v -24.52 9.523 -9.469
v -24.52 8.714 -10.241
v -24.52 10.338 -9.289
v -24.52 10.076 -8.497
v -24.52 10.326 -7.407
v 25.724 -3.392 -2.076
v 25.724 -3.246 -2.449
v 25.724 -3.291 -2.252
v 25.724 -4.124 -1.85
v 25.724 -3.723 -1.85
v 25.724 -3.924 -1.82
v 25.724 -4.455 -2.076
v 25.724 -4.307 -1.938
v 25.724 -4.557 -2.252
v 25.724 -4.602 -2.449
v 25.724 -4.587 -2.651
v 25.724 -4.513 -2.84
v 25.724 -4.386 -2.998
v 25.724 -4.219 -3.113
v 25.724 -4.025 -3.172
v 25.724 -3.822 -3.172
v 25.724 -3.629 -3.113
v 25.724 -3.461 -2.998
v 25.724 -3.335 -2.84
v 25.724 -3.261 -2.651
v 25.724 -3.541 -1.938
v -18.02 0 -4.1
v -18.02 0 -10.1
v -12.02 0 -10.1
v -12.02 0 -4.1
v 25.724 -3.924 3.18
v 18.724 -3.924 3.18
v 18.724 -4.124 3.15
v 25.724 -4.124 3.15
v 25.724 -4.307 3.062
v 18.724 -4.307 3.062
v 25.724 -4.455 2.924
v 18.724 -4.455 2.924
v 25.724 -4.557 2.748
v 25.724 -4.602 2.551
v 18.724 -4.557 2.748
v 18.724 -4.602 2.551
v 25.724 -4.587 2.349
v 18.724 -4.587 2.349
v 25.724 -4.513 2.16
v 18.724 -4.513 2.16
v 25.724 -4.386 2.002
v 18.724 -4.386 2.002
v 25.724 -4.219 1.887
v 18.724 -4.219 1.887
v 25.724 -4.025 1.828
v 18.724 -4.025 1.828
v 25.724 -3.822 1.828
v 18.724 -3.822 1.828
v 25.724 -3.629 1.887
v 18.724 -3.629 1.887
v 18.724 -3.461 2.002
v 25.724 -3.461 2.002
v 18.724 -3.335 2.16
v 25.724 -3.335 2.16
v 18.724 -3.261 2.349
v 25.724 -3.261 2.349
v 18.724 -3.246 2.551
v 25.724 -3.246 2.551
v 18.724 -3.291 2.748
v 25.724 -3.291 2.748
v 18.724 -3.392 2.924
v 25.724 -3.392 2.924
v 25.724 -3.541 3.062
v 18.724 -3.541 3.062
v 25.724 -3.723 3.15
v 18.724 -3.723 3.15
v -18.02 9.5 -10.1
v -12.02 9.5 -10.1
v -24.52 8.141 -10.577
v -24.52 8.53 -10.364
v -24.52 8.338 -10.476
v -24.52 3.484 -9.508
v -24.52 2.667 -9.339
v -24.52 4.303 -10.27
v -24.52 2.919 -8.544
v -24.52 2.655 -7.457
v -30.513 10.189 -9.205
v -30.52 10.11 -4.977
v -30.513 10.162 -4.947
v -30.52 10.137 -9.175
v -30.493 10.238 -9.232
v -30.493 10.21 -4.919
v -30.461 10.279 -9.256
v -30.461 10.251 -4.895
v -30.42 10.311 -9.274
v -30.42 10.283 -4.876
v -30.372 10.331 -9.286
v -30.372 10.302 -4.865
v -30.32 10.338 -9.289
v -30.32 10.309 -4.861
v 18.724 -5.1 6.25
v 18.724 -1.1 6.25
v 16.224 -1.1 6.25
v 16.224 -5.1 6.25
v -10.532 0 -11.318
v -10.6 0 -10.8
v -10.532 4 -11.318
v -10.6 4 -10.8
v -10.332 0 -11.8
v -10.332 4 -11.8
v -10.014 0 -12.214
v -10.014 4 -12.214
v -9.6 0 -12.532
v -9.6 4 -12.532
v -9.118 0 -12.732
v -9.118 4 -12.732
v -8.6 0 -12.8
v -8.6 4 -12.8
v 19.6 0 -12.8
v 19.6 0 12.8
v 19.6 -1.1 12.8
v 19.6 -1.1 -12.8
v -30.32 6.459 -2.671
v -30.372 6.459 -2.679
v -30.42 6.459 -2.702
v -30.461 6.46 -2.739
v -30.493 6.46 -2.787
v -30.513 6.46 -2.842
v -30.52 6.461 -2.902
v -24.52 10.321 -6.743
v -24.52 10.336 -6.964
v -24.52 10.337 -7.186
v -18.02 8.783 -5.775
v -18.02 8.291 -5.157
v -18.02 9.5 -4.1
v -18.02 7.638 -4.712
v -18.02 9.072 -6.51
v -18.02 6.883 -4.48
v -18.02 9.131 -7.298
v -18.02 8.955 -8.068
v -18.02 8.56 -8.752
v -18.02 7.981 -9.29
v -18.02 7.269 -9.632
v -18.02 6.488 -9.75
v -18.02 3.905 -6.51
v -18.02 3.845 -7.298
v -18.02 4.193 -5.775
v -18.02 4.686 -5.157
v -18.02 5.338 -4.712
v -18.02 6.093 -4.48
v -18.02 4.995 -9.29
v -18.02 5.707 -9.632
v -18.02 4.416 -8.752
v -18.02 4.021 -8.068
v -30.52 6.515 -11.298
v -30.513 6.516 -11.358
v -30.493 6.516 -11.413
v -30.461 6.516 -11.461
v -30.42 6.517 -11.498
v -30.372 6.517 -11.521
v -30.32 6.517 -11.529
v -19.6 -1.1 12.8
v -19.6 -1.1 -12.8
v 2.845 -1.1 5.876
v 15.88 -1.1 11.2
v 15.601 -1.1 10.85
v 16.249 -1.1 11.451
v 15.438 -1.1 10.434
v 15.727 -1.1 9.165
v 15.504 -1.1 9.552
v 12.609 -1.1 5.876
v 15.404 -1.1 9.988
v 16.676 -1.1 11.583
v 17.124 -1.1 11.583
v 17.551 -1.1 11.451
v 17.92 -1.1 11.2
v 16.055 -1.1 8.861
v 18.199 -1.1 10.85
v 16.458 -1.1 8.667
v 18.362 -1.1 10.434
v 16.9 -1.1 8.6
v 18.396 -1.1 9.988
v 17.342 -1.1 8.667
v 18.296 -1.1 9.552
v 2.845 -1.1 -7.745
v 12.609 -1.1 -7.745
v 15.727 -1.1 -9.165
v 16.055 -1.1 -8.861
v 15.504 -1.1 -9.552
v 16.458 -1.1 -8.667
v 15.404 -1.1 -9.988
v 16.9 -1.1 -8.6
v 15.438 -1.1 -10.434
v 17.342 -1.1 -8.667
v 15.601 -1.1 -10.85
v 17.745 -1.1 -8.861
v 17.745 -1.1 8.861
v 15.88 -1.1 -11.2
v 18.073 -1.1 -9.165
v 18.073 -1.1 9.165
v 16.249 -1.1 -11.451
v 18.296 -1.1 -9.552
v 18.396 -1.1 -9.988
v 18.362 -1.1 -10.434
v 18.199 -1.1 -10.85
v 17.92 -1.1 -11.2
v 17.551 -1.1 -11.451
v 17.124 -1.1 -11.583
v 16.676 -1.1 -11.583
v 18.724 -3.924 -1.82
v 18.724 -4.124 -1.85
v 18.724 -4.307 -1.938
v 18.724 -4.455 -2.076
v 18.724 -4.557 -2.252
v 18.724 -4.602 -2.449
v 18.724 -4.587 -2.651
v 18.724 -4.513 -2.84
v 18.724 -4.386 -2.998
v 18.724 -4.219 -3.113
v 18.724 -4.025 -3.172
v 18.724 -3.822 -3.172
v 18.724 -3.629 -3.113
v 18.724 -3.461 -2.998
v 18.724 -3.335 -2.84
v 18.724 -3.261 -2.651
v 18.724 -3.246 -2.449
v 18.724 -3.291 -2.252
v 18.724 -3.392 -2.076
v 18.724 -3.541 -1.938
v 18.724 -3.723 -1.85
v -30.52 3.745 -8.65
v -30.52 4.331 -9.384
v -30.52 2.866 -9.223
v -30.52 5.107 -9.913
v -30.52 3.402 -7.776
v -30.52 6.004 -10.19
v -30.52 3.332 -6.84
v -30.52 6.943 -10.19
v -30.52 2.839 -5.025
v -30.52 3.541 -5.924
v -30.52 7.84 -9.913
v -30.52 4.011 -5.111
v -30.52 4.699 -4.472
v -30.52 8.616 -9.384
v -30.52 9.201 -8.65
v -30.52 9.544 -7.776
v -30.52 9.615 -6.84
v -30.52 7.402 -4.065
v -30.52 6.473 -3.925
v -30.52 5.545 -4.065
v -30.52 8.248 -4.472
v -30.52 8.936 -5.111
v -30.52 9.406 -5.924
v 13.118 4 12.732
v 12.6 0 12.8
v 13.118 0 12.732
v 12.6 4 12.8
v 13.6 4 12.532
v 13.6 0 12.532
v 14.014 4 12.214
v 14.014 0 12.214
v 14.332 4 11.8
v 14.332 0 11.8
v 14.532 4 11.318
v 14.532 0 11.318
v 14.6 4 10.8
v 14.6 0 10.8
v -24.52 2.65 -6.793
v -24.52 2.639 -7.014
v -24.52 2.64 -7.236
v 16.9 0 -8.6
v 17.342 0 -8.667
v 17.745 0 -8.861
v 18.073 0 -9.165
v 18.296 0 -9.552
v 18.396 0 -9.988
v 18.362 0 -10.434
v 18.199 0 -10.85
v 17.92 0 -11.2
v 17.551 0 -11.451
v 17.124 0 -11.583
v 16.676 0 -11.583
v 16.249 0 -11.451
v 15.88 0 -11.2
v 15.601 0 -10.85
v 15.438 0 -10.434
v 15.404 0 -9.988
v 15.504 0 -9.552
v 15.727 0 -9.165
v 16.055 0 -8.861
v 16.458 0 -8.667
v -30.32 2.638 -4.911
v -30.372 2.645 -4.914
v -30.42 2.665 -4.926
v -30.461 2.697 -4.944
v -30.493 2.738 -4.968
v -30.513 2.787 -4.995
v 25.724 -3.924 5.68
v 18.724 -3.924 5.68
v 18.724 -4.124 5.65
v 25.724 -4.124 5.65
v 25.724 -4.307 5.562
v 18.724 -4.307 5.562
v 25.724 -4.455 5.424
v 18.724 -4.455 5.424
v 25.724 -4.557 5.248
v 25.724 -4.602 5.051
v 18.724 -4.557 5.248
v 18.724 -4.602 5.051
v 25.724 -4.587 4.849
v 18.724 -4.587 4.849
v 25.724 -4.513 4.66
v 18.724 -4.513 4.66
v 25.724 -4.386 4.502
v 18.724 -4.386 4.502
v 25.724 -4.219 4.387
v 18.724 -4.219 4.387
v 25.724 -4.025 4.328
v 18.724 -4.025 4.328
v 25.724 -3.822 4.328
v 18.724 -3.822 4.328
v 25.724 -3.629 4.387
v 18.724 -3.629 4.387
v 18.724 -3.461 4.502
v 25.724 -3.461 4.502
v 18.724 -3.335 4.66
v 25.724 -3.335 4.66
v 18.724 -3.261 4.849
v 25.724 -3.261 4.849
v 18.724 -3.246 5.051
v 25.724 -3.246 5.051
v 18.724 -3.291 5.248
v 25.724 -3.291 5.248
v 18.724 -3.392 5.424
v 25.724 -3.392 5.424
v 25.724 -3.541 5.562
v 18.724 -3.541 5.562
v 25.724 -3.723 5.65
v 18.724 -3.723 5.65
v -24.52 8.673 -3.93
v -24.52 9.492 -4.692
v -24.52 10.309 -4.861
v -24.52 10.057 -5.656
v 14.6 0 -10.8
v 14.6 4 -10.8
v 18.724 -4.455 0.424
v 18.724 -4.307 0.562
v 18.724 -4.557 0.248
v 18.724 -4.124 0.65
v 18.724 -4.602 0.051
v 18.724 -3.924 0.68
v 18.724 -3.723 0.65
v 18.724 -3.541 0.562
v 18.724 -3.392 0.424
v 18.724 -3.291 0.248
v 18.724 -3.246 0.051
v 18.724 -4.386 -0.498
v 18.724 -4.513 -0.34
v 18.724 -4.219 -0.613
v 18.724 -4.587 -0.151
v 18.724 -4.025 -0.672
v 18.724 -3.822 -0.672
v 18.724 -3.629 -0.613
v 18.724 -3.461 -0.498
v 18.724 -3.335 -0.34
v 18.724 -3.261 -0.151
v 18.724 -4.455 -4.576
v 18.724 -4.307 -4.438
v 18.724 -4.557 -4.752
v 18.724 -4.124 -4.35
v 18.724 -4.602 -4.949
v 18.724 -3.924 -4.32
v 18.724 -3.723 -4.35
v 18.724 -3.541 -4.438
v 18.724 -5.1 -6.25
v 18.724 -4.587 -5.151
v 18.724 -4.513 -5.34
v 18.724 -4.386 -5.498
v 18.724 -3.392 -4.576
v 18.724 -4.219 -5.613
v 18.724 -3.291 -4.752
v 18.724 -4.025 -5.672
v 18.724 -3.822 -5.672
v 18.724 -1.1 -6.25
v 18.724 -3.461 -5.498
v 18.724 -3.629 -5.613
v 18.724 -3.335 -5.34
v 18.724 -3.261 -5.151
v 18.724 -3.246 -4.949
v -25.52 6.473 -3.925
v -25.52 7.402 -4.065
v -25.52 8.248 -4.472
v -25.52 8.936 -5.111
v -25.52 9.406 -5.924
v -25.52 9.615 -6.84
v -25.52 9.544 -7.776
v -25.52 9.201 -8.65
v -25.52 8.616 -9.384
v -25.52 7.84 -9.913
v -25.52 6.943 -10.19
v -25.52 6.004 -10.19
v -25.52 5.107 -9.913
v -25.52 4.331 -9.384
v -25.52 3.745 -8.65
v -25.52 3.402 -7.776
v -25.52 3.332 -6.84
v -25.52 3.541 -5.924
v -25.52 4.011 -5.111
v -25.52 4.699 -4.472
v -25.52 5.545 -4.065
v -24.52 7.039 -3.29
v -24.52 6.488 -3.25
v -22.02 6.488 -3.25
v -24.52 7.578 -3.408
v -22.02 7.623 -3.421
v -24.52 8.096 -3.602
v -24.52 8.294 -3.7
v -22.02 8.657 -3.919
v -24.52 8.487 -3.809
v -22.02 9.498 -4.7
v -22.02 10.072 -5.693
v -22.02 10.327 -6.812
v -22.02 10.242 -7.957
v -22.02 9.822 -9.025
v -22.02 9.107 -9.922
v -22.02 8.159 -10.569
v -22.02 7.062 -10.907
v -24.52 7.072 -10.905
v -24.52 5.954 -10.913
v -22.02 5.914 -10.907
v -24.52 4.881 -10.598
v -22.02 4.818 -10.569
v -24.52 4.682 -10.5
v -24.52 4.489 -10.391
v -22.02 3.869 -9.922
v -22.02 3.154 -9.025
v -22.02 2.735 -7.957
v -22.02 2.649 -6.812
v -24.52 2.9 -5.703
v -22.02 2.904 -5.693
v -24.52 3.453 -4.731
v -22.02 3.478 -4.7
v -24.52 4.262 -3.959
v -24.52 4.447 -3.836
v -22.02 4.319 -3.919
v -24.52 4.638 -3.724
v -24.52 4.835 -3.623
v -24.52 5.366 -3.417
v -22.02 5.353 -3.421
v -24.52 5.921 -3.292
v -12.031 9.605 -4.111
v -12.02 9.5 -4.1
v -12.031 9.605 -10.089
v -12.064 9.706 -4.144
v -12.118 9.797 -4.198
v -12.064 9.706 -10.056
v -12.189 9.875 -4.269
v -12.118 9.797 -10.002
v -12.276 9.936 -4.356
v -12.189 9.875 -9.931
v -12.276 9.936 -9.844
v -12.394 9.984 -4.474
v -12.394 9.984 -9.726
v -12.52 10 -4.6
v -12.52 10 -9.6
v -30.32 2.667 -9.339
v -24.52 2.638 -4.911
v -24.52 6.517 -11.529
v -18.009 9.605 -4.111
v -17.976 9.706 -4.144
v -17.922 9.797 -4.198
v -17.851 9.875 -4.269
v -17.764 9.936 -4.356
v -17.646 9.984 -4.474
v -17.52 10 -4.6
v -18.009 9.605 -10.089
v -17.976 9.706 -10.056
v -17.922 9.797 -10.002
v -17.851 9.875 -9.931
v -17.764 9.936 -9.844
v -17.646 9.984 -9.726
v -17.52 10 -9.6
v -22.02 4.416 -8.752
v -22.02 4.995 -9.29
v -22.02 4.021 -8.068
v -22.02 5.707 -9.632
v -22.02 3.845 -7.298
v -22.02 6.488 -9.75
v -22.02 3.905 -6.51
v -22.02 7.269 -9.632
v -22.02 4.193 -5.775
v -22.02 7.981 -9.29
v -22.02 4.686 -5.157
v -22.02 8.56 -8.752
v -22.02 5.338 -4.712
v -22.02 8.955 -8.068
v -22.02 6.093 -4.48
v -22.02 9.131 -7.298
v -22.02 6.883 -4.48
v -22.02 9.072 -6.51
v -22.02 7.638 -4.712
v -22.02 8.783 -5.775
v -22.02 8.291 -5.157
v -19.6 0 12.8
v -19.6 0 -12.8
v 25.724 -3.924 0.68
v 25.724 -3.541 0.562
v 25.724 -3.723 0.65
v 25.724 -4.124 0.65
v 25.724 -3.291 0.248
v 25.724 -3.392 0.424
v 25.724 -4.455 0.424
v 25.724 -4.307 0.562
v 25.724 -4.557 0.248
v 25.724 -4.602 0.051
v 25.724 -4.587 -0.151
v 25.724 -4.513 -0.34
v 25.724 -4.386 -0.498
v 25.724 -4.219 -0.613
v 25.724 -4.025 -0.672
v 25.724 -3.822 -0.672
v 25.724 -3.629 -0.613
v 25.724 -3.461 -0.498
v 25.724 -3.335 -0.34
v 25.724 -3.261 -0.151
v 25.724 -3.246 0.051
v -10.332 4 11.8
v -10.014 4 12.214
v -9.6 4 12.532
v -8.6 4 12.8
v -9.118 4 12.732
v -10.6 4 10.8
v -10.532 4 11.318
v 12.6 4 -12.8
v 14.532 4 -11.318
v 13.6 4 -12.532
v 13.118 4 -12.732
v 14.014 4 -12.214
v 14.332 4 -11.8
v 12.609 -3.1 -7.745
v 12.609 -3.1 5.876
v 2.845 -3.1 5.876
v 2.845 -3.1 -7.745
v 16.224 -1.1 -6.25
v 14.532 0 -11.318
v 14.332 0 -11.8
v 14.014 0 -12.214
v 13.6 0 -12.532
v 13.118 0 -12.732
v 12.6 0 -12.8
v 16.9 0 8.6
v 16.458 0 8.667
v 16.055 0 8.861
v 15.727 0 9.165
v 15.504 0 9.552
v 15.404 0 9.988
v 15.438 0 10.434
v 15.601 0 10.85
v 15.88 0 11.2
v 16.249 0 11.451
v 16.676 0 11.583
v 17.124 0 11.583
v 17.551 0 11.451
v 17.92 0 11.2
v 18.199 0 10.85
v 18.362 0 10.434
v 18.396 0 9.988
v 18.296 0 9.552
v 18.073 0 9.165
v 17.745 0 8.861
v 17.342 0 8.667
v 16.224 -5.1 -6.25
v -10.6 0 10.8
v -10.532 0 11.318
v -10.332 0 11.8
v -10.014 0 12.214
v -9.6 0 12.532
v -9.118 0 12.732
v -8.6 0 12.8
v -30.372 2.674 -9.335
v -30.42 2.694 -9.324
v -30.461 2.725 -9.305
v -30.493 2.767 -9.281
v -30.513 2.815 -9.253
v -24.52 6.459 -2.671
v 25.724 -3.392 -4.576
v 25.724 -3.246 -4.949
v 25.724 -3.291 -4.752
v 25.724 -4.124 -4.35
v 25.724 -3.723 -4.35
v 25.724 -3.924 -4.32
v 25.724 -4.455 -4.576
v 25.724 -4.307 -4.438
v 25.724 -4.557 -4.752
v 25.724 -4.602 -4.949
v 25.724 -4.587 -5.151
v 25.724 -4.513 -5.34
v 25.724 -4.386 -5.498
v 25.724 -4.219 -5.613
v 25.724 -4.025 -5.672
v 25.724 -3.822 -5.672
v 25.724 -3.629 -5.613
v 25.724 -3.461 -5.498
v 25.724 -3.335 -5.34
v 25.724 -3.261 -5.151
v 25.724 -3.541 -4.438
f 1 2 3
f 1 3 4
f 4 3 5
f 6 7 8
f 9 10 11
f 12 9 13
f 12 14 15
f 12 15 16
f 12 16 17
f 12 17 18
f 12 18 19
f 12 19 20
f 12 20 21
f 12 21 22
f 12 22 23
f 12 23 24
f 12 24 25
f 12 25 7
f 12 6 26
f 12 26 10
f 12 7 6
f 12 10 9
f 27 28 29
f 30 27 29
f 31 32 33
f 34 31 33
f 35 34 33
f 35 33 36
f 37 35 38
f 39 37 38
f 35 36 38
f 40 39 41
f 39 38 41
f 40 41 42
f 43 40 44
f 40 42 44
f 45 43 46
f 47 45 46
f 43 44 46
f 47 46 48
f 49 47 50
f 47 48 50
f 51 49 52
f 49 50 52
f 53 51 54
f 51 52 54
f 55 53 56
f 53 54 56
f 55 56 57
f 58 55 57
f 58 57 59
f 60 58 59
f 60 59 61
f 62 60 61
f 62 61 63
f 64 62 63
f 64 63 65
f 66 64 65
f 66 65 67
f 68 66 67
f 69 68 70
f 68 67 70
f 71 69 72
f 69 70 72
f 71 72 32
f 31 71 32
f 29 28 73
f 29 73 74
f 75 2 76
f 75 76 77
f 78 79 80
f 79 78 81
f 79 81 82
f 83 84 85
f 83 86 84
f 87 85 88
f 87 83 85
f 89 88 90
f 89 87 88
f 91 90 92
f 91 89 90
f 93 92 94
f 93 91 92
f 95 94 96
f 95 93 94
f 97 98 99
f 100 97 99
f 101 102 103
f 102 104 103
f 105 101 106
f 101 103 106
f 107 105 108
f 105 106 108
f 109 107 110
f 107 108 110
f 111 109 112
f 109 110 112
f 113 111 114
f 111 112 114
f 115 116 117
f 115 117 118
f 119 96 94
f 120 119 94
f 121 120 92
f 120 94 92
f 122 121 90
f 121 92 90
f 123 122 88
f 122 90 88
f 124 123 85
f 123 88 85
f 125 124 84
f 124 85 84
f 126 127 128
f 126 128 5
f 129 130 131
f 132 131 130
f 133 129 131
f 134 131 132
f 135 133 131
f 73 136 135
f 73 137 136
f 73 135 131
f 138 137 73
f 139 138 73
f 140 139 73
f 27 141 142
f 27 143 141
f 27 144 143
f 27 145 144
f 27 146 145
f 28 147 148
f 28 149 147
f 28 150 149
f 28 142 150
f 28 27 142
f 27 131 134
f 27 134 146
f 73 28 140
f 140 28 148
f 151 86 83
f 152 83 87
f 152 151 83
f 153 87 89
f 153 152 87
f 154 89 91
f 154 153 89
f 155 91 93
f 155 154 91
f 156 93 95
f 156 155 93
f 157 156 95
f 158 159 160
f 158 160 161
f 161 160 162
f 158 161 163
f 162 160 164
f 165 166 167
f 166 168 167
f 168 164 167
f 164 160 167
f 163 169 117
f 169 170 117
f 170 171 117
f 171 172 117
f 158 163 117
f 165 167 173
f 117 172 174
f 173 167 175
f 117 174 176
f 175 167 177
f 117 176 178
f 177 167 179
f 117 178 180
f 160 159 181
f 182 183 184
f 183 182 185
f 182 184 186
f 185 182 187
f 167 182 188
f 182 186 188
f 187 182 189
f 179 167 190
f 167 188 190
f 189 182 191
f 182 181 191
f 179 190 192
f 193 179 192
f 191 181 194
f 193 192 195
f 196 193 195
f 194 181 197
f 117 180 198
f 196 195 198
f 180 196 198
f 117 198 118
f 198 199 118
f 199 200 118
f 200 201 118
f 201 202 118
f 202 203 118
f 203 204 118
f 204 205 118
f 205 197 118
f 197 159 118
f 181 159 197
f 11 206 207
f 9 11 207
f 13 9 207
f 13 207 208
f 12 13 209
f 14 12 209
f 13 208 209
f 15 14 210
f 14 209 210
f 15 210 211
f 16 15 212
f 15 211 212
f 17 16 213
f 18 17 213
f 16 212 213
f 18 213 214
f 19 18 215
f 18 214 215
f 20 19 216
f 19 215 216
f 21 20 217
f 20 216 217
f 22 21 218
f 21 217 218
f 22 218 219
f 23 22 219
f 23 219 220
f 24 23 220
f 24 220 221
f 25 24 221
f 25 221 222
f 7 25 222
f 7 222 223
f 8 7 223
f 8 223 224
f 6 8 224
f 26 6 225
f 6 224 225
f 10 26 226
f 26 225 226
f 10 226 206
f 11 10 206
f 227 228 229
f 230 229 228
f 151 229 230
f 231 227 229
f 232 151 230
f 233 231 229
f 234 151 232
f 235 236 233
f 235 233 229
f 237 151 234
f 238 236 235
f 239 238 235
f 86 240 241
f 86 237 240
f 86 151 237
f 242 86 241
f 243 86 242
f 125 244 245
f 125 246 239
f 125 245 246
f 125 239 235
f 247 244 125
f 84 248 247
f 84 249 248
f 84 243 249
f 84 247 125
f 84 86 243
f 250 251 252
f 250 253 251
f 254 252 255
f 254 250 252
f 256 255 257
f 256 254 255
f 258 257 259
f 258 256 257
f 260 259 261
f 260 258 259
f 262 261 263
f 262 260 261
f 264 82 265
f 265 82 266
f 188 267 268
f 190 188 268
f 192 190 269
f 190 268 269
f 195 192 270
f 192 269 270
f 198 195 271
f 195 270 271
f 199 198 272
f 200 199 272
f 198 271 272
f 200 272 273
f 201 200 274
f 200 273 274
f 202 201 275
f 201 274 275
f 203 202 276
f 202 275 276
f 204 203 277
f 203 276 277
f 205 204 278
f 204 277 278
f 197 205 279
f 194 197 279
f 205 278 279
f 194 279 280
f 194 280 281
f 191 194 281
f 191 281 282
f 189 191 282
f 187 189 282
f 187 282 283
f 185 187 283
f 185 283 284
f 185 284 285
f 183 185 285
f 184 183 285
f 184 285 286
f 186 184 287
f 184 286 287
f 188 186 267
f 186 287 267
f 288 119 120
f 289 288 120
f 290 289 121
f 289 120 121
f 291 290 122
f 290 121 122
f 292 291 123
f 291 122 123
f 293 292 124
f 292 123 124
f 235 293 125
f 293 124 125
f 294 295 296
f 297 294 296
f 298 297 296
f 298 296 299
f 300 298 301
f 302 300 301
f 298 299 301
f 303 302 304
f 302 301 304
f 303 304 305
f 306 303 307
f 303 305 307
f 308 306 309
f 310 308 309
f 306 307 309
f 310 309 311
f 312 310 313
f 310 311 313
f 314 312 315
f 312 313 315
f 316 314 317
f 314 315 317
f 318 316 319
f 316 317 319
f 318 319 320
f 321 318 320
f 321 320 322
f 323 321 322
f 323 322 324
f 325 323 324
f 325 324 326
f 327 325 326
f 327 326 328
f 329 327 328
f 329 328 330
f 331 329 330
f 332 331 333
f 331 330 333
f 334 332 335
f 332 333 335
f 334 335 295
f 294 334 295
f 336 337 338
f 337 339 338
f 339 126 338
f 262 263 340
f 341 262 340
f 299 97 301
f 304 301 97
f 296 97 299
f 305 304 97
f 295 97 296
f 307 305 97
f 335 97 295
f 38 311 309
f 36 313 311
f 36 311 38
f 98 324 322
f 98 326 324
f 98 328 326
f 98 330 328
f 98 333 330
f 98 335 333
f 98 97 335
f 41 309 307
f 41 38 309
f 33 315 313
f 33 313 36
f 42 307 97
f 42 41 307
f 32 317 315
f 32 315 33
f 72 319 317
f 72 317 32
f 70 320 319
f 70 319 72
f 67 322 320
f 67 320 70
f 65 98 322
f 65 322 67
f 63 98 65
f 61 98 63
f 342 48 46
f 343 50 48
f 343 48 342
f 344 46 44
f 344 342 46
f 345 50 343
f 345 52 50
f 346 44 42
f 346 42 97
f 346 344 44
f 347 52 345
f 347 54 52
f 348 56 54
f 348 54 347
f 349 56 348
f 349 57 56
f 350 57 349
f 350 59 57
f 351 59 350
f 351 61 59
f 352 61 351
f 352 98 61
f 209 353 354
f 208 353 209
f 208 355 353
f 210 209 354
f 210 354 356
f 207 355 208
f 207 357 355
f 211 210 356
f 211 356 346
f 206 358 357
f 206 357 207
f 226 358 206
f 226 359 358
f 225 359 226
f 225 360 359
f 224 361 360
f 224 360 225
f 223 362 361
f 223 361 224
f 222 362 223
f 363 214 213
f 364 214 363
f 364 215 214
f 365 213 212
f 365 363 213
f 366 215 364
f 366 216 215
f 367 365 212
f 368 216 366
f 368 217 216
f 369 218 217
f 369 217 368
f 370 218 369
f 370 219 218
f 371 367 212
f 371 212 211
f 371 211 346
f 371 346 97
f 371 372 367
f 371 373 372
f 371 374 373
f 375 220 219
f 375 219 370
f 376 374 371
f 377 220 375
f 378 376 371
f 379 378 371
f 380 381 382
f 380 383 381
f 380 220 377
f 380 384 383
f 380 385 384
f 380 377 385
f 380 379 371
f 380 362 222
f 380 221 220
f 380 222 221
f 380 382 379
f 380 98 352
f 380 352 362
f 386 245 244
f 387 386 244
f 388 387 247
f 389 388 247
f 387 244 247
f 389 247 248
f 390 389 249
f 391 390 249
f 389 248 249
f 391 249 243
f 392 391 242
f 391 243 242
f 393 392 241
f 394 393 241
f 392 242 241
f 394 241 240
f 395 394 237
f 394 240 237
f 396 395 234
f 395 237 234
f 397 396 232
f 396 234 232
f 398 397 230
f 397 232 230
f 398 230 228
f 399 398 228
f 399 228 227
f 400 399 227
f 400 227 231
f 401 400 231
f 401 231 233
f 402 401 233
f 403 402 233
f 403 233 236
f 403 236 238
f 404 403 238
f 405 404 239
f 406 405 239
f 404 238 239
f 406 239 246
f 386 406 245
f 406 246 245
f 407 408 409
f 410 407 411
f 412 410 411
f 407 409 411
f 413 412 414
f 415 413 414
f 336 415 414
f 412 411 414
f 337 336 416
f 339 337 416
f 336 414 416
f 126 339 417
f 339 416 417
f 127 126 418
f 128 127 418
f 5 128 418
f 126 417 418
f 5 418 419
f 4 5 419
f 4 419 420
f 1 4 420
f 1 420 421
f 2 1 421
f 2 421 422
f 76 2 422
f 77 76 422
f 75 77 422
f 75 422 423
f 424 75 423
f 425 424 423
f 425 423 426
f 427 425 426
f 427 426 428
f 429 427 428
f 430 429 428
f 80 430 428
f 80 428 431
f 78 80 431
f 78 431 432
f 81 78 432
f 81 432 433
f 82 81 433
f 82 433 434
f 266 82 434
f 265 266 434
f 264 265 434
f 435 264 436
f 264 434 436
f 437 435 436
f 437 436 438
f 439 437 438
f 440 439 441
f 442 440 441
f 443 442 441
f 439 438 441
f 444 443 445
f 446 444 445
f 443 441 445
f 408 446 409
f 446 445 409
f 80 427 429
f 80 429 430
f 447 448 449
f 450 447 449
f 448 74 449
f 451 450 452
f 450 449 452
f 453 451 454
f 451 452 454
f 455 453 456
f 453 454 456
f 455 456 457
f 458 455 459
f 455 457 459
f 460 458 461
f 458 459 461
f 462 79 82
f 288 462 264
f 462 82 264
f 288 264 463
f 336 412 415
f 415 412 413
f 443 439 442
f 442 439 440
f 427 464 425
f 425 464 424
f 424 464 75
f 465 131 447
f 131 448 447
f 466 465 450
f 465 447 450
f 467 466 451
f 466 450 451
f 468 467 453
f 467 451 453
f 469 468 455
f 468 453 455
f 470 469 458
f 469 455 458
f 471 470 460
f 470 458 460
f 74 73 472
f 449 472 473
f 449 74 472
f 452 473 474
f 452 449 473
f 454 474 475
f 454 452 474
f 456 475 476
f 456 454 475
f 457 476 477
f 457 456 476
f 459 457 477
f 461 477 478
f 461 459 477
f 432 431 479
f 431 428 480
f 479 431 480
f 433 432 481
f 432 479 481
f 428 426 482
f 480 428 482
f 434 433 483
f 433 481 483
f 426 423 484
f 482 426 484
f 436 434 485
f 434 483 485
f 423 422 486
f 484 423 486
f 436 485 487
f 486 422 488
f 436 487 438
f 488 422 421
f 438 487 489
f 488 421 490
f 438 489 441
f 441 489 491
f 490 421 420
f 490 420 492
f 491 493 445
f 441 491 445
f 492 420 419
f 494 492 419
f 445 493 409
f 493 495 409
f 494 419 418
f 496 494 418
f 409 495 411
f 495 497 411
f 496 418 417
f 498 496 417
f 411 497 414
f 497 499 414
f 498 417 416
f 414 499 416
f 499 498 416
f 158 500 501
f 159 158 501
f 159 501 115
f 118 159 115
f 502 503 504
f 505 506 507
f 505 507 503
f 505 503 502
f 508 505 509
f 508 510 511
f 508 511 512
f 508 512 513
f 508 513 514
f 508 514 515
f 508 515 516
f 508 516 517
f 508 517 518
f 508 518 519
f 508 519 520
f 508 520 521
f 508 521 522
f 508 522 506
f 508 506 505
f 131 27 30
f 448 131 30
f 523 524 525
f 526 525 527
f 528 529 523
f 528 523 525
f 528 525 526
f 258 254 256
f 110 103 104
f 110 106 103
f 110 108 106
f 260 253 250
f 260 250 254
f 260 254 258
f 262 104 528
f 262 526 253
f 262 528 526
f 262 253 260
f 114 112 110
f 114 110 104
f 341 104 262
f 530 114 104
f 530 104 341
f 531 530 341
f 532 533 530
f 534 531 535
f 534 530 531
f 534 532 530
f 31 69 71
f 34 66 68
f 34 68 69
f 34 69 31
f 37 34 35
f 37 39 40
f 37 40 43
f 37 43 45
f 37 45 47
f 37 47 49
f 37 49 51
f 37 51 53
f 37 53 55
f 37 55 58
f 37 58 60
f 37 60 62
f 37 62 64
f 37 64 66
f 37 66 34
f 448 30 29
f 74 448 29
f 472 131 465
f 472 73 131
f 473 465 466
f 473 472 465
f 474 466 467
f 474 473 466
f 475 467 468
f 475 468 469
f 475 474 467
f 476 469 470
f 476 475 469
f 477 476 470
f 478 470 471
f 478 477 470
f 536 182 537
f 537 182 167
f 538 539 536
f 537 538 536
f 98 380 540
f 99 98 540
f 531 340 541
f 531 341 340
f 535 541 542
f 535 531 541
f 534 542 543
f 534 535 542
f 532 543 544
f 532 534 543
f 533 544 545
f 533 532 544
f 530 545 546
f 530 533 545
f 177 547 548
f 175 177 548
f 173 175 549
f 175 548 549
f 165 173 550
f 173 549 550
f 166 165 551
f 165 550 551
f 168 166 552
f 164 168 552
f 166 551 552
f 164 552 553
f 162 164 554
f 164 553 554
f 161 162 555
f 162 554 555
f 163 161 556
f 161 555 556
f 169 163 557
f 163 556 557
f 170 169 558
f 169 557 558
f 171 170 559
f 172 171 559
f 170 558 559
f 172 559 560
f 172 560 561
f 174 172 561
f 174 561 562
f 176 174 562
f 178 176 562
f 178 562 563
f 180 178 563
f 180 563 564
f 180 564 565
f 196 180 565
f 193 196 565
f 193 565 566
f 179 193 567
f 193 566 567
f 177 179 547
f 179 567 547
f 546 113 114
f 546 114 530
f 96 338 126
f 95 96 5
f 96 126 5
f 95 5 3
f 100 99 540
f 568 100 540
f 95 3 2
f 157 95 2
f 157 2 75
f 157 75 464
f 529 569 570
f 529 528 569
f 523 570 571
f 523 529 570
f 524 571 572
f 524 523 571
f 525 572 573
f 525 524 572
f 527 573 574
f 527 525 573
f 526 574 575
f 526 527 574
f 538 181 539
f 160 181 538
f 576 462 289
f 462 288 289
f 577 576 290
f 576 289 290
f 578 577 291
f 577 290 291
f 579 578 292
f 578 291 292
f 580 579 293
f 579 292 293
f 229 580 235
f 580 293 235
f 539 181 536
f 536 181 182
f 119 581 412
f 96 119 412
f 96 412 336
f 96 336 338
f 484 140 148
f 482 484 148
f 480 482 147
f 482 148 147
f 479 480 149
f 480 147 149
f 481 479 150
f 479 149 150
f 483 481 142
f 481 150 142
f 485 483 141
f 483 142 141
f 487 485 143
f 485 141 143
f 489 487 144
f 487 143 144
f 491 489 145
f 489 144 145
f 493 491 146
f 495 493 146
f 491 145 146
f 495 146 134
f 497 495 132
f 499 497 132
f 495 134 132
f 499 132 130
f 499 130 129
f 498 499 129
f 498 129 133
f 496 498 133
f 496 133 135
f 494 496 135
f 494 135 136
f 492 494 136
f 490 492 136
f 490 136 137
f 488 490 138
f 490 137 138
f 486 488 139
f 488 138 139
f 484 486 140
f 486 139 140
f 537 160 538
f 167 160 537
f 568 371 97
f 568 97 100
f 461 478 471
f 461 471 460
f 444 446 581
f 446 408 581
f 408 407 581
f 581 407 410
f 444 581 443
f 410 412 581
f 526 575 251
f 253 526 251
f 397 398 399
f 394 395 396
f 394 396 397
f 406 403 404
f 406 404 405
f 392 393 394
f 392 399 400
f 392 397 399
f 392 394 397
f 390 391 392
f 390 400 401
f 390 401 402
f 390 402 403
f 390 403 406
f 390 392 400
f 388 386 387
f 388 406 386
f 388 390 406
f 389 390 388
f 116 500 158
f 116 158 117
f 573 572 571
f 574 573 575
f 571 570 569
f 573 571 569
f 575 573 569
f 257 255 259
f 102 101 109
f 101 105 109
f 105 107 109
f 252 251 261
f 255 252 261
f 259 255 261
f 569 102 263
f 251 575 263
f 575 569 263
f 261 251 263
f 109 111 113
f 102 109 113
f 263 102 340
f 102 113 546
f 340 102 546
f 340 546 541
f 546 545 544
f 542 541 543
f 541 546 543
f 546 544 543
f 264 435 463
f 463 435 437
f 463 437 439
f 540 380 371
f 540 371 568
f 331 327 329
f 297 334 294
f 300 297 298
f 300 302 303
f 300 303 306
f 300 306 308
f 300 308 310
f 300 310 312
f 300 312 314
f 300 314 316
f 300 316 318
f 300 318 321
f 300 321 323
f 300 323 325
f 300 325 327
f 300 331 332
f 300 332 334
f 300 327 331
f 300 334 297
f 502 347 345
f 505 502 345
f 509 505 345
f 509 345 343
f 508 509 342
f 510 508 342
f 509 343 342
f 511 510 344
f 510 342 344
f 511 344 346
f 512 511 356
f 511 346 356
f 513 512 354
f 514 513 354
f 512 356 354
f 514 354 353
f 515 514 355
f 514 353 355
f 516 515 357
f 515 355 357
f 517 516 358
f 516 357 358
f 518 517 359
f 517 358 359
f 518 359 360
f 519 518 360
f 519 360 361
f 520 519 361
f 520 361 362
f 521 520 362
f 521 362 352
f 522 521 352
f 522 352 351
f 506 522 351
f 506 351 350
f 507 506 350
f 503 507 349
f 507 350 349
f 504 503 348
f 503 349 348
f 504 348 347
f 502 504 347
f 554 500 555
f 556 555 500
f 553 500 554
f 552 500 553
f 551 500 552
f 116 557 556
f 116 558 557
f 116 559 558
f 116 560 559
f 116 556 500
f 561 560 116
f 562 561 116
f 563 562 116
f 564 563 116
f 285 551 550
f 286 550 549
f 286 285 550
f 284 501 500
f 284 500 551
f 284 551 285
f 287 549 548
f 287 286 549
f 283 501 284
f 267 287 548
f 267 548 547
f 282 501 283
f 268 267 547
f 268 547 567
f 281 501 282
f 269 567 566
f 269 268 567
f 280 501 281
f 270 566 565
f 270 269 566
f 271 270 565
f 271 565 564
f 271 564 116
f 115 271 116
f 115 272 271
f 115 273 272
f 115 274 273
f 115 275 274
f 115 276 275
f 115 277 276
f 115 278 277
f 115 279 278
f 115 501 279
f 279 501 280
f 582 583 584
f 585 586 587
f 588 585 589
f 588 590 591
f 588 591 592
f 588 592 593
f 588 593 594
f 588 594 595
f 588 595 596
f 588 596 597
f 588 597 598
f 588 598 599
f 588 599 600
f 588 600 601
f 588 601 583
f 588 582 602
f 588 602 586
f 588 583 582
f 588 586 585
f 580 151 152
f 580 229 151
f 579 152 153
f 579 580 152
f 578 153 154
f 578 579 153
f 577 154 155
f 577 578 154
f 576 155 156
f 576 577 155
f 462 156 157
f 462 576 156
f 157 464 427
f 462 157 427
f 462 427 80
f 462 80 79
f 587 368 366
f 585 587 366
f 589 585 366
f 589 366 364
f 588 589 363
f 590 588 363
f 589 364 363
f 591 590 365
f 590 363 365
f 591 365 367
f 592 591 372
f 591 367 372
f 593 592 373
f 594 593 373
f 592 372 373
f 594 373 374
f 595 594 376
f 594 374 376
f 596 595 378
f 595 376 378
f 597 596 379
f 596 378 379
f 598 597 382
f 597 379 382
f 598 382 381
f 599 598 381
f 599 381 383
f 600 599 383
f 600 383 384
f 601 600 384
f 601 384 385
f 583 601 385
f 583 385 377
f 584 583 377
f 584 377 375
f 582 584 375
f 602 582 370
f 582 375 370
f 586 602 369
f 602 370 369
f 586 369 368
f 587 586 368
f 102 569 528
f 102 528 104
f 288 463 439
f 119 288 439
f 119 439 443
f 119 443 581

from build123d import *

# Parameters (mm, degrees)
SKETCH_1_W          = 39.2
SKETCH_1_H          = 25.6
SKETCH_1_R          = 1.5
EXTRUDE_1_DEPTH     = 1.1
SKETCH_1_4_W        = 25.2
SKETCH_1_4_H        = 25.6
EXTRUDE_3_DEPTH     = 4
FILLET_1_R          = 2
SKETCH_2_W          = 6
SKETCH_2_H          = 6
EXTRUDE_4_DEPTH     = 10
FILLET_2_R          = 0.5
SKETCH_3_R          = 2.65
EXTRUDE_5_DEPTH     = 4
SKETCH_4_R          = 3.85
EXTRUDE_6_DEPTH     = 2.5
EXTRUDE_7_DEPTH     = 6
SKETCH_6_R          = 3.15
CUT_EXTRUDE_1_DEPTH = 5
FILLET_3_R          = 0.2
SKETCH_7_W          = 2.5
SKETCH_7_H          = 12.5
EXTRUDE_8_DEPTH     = 4
SKETCH_8_R          = 0.68
EXTRUDE_9_DEPTH     = 7
SKETCH_9_W          = 9.763882412
SKETCH_9_H          = 13.621218674
EXTRUDE_10_DEPTH    = 2


with BuildPart() as part:
    # 草图1 → 凸台-拉伸1 (new body)
    with BuildSketch(Plane(origin=(0, 0, 0), x_dir=(1, 0, 0), z_dir=(0, 1, 0))):
        Rectangle(SKETCH_1_W, SKETCH_1_H)
        with Locations((16.9, 10.1)):
            Circle(SKETCH_1_R, mode=Mode.SUBTRACT)
        with Locations((16.9, -10.1)):
            Circle(SKETCH_1_R, mode=Mode.SUBTRACT)
    extrude(amount=-EXTRUDE_1_DEPTH)

    # 草图9 → 凸台-拉伸10 (add)
    with BuildSketch(Plane.XZ.offset(1.1)):
        with Locations((7.727328673, -0.934198626)):
            Rectangle(SKETCH_9_W, SKETCH_9_H)
    extrude(amount=EXTRUDE_10_DEPTH)


with BuildPart() as body_2:
    # 草图1<4> → 凸台-拉伸3 (new body)
    with BuildSketch(Plane(origin=(0, 0, 0), x_dir=(1, 0, 0), z_dir=(0, 1, 0))):
        with Locations((2, 0)):
            Rectangle(SKETCH_1_4_W, SKETCH_1_4_H)
    extrude(amount=EXTRUDE_3_DEPTH)

    # 圆角1
    fillet_1_edges = [body_2.edges().sort_by_distance(p)[0] for p in [
        (-10.6, 2, -12.8),
        (14.6, 2, -12.8),
        (14.6, 2, 12.8),
        (-10.6, 2, 12.8),
    ]]
    fillet(fillet_1_edges, radius=FILLET_1_R)


with BuildPart() as body_3:
    # 草图2 → 凸台-拉伸4 (new body)
    with BuildSketch(Plane(origin=(0, 0, 0), x_dir=(1, 0, 0), z_dir=(0, 1, 0))):
        with Locations((-15.02, 7.1)):
            Rectangle(SKETCH_2_W, SKETCH_2_H)
    extrude(amount=EXTRUDE_4_DEPTH)

    # 圆角2
    fillet_2_edges = [body_3.edges().sort_by_distance(p)[0] for p in [
        (-12.02, 10, -7.1),
        (-15.02, 10, -10.1),
        (-18.02, 10, -7.1),
        (-15.02, 10, -4.1),
    ]]
    fillet(fillet_2_edges, radius=FILLET_2_R)

    # 草图3 → 凸台-拉伸5 (add)
    with BuildSketch(Plane.ZY.offset(18.02)):
        with Locations((-7.1, 6.488063406)):
            Circle(SKETCH_3_R)
    extrude(amount=EXTRUDE_5_DEPTH)

    # 草图4 → 凸台-拉伸6 (add)
    with BuildSketch(Plane.ZY.offset(22.02)):
        with Locations((-7.1, 6.488063406)):
            Circle(SKETCH_4_R)
    extrude(amount=EXTRUDE_6_DEPTH)

    # 草图5 → 凸台-拉伸7 (add)
    with BuildSketch(Plane.ZY.offset(24.52)):
        Polygon((-4.910515511, 2.638063406), (-2.671059951, 6.459212594), (-4.86054444, 10.309212594), (-9.289484489, 10.338063406), (-11.528940049, 6.516914218), (-9.33945556, 2.666914218), align=None)
    extrude(amount=EXTRUDE_7_DEPTH)

    # 草图6 → 切除-拉伸1 (cut)
    with BuildSketch(Plane.ZY.offset(30.52)):
        with Locations((-7.075014464, 6.473420168)):
            Circle(SKETCH_6_R)
    extrude(amount=-CUT_EXTRUDE_1_DEPTH, mode=Mode.SUBTRACT)

    # 圆角3
    fillet_3_edges = [body_3.edges().sort_by_distance(p)[0] for p in [
        (-30.52, 8.384212594, -3.765802195),
        (-30.52, 4.548638, -3.790787731),
        (-30.52, 2.652488812, -7.124985536),
        (-30.52, 4.591914218, -10.434197805),
        (-30.52, 8.427488812, -10.409212269),
        (-30.52, 10.323638, -7.075014464),
    ]]
    fillet(fillet_3_edges, radius=FILLET_3_R)


with BuildPart() as body_4:
    # 草图7 → 凸台-拉伸8 (new body)
    with BuildSketch(Plane(origin=(0, -1.1, 0), x_dir=(-1, 0, 0), z_dir=(0, -1, 0))):
        with Locations((-17.473641974, 0)):
            Rectangle(SKETCH_7_W, SKETCH_7_H)
    extrude(amount=EXTRUDE_8_DEPTH)

    # 草图8 → 凸台-拉伸9 (add)
    with BuildSketch(Plane(origin=(18.723641974, 0, 0), x_dir=(0, 0, -1), z_dir=(1, 0, 0))):
        with Locations((-5, -3.923750137)):
            Circle(SKETCH_8_R)
        with Locations((-2.5, -3.923750137)):
            Circle(SKETCH_8_R)
        with Locations((0, -3.923750137)):
            Circle(SKETCH_8_R)
        with Locations((2.5, -3.923750137)):
            Circle(SKETCH_8_R)
        with Locations((5, -3.923750137)):
            Circle(SKETCH_8_R)
    extrude(amount=EXTRUDE_9_DEPTH)


solid = Compound([part.part, body_2.part, body_3.part, body_4.part])
